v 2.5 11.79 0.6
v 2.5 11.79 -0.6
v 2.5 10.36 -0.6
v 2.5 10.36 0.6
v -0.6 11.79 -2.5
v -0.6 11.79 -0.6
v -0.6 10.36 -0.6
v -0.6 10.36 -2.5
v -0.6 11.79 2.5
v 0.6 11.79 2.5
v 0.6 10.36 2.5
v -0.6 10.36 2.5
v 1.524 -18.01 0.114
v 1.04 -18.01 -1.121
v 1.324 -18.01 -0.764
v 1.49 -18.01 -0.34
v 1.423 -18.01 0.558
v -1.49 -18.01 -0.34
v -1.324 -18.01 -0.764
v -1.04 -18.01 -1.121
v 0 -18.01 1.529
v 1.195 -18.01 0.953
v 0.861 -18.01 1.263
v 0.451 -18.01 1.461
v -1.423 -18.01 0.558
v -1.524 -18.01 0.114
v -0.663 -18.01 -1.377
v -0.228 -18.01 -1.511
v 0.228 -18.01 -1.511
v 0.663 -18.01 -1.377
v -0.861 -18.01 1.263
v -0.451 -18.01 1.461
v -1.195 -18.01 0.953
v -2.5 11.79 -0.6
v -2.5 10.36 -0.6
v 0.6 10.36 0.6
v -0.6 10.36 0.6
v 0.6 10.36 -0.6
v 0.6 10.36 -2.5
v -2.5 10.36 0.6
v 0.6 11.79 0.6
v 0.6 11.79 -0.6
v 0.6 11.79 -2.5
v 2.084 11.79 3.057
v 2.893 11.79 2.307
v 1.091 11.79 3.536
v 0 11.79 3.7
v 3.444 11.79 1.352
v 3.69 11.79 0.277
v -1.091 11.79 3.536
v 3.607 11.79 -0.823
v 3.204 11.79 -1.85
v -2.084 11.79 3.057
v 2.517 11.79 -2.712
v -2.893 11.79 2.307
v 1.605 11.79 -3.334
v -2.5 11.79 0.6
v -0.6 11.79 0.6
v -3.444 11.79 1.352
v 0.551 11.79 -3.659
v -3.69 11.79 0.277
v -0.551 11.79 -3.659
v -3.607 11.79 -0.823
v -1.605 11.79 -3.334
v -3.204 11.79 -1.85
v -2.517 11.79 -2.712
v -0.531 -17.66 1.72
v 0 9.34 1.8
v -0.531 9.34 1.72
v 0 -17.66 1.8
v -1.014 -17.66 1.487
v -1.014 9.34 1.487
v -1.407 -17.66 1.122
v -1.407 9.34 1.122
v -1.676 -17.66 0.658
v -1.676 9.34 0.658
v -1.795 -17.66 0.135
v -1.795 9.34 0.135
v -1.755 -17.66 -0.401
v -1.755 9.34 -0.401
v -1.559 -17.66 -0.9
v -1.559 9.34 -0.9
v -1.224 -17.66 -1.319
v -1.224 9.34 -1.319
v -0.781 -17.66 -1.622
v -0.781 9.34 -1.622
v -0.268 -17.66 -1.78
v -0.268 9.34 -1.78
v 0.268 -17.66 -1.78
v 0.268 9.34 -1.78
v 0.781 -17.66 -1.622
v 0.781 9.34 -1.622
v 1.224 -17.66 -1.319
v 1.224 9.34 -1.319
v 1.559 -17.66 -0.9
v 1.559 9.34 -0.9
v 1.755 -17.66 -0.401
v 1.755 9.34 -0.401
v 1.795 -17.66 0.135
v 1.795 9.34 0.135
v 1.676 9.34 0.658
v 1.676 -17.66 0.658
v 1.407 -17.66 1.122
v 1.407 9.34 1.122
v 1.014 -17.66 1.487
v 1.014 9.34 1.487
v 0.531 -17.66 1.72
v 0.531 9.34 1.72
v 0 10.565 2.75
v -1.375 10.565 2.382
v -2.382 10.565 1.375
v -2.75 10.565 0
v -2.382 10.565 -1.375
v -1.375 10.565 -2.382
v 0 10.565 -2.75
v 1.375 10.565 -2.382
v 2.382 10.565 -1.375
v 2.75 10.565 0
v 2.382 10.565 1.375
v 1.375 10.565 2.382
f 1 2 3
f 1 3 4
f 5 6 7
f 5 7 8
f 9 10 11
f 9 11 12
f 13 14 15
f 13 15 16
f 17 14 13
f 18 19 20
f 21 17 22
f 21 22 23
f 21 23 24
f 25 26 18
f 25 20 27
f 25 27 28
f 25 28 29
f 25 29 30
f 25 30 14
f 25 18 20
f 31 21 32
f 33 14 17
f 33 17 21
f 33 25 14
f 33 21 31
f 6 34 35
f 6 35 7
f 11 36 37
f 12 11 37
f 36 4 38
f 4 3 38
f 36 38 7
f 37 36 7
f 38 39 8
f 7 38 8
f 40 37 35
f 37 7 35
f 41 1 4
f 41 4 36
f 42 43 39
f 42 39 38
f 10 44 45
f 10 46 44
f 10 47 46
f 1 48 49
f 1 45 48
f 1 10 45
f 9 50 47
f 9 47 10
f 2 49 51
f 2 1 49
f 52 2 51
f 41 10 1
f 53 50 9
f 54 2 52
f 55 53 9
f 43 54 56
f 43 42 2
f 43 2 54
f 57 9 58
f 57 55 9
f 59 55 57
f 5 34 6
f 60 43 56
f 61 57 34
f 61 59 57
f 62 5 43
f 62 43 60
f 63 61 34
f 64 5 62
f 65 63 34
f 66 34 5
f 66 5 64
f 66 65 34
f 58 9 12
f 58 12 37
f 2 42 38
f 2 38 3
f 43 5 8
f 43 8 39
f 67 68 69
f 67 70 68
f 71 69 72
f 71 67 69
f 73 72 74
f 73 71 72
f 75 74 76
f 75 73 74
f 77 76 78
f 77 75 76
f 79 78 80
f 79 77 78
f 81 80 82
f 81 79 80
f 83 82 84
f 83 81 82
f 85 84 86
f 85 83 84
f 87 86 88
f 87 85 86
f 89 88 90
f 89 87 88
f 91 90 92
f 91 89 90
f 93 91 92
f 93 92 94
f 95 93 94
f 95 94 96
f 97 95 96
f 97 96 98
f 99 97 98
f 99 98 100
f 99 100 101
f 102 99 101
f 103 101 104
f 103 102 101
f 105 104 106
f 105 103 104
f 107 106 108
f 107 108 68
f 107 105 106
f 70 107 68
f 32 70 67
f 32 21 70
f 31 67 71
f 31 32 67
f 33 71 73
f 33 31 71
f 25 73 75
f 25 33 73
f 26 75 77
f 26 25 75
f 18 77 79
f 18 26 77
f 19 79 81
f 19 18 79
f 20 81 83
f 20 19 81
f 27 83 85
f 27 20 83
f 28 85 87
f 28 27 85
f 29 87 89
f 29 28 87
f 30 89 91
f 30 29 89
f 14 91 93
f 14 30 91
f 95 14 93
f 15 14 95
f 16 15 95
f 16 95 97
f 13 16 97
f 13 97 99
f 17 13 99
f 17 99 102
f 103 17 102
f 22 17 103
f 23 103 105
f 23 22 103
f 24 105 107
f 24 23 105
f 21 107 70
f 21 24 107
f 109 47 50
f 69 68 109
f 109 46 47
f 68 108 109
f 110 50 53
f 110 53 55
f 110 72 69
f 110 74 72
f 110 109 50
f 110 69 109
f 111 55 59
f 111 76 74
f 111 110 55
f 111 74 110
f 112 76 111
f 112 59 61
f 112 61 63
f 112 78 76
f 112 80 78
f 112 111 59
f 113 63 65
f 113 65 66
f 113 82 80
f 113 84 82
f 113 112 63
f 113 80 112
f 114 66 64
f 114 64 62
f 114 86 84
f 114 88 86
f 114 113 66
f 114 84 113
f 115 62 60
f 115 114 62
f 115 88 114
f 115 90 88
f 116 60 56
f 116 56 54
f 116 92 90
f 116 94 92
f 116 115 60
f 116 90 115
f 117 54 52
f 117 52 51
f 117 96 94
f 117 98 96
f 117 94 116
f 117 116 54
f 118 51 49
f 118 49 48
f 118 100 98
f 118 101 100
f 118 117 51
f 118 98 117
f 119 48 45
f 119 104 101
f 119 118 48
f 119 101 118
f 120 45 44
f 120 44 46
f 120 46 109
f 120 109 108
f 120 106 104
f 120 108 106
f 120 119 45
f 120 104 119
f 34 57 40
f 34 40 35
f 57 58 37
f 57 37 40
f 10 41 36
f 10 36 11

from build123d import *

# Parameters (mm, degrees)
CUT_EXTRUDE1_DEPTH = 1.43


with BuildPart() as part:
    # Sketch1 → Revolve1 (revolve)
    with BuildSketch(Plane(origin=(0, 0, 0), x_dir=(0, 0, -1), z_dir=(1, 0, 0))):
        Polygon((0, 11.789679649), (-3.7, 11.789679649), (-1.8, 9.339679649), (-1.8, -17.660320351), (-1.528571429, -18.010320351), (0, -18.010320351), align=None)
    revolve(axis=Axis((0, 14.440515102, 0), (0, -1, 0)))

    # Sketch2 → Cut-Extrude1 (cut)
    with BuildSketch(Plane(origin=(0, 11.789679649, 0), x_dir=(1, 0, 0), z_dir=(0, 1, 0))):
        Polygon((2.5, -0.6), (0.6, -0.6), (0.6, -2.5), (-0.6, -2.5), (-0.6, -0.6), (-2.5, -0.6), (-2.5, 0.6), (-0.6, 0.6), (-0.6, 2.5), (0.6, 2.5), (0.6, 0.6), (2.5, 0.6), align=None)
    extrude(amount=-CUT_EXTRUDE1_DEPTH, mode=Mode.SUBTRACT)


solid = part.part
